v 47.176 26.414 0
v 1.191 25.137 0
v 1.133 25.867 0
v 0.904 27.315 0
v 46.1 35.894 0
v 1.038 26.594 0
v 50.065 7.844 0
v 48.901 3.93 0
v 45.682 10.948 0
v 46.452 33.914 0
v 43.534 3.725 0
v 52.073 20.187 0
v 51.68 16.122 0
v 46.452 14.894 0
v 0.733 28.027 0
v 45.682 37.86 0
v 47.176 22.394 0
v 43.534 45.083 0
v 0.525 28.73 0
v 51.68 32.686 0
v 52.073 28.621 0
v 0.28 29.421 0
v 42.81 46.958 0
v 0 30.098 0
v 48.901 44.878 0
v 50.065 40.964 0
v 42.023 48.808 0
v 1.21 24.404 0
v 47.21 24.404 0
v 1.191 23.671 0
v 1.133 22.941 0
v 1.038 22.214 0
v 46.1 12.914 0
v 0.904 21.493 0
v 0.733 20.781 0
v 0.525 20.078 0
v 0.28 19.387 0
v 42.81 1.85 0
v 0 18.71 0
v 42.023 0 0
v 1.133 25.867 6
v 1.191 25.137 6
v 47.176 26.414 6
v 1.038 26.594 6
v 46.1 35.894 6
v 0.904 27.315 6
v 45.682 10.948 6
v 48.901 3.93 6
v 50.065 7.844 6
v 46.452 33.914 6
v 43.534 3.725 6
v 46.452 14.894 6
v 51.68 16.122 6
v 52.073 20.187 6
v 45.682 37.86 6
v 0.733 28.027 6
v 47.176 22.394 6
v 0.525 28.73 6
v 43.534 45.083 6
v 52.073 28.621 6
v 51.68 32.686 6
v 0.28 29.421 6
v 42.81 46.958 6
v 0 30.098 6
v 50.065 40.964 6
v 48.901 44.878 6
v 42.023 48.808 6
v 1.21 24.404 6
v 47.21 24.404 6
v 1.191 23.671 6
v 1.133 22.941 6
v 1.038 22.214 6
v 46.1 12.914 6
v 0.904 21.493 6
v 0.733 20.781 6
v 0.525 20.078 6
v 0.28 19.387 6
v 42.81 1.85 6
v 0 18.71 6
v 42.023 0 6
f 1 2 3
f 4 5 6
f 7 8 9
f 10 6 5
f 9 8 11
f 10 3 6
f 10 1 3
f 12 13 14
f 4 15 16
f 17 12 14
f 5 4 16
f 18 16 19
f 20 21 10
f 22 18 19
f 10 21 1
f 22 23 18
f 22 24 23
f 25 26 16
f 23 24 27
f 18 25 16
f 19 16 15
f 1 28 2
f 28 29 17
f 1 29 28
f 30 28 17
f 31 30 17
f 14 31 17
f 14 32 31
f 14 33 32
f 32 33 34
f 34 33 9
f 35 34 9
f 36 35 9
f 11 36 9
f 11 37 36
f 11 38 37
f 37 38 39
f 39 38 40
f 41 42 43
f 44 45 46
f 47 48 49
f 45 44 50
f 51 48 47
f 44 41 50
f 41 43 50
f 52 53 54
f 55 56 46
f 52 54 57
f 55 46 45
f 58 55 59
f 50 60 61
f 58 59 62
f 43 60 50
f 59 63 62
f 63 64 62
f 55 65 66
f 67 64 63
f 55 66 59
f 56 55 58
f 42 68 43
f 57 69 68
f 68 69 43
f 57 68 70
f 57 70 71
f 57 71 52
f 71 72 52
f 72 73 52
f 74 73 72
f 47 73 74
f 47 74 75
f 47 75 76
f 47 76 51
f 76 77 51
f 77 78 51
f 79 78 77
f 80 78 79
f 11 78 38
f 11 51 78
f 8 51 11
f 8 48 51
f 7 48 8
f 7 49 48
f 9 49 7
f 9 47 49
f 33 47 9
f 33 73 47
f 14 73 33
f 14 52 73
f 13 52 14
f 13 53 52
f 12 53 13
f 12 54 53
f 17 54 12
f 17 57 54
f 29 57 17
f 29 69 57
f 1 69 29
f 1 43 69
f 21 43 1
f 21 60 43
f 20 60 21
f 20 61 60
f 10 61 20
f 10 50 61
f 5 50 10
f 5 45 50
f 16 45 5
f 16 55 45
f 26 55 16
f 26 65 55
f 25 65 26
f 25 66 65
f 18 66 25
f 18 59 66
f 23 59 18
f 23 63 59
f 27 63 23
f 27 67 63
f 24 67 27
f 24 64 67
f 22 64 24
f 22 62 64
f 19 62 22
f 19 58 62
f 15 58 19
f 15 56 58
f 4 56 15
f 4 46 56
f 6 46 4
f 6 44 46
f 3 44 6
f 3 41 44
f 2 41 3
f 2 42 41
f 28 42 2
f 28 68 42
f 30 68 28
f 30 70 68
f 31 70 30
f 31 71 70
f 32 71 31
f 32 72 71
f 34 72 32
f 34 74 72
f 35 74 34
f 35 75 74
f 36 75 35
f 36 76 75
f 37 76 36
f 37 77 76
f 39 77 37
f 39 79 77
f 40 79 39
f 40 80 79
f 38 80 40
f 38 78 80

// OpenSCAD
$fn = 32;

// ----------------------------------------------------------------------
// Gear sector: 4 teeth on 48 degrees
// ----------------------------------------------------------------------

// --- parameters (mm) ---
sector_angle = 48;        // sector angle, degrees
root_r = 60;              // root circle radius
tooth_h = 5;              // tooth height over the root circle
teeth = 4;                // number of teeth on the sector
hub_r = 14;               // hub bore radius
plate_t = 6;              // sector thickness, Z
arc_step = 3;             // sampling step of the root/hub arcs, degrees

tip_r = root_r + tooth_h;  // tip circle radius

profile = [[42.023, 0], [42.81, 1.85], [43.534, 3.725], [48.901, 3.93], [50.065, 7.844], [45.682, 10.948], [46.1, 12.914], [46.452, 14.894], [51.68, 16.122], [52.073, 20.187], [47.176, 22.394], [47.21, 24.404], [47.176, 26.414], [52.073, 28.621], [51.68, 32.686], [46.452, 33.914], [46.1, 35.894], [45.682, 37.86], [50.065, 40.964], [48.901, 44.878], [43.534, 45.083], [42.81, 46.958], [42.023, 48.808], [0, 30.098], [0.28, 29.421], [0.525, 28.73], [0.733, 28.027], [0.904, 27.315], [1.038, 26.594], [1.133, 25.867], [1.191, 25.137], [1.21, 24.404], [1.191, 23.671], [1.133, 22.941], [1.038, 22.214], [0.904, 21.493], [0.733, 20.781], [0.525, 20.078], [0.28, 19.387], [0, 18.71]];  // primary outline, 40 points, counter clockwise

// --- the one profile operation ---
linear_extrude(height = plate_t) polygon(points = profile);
